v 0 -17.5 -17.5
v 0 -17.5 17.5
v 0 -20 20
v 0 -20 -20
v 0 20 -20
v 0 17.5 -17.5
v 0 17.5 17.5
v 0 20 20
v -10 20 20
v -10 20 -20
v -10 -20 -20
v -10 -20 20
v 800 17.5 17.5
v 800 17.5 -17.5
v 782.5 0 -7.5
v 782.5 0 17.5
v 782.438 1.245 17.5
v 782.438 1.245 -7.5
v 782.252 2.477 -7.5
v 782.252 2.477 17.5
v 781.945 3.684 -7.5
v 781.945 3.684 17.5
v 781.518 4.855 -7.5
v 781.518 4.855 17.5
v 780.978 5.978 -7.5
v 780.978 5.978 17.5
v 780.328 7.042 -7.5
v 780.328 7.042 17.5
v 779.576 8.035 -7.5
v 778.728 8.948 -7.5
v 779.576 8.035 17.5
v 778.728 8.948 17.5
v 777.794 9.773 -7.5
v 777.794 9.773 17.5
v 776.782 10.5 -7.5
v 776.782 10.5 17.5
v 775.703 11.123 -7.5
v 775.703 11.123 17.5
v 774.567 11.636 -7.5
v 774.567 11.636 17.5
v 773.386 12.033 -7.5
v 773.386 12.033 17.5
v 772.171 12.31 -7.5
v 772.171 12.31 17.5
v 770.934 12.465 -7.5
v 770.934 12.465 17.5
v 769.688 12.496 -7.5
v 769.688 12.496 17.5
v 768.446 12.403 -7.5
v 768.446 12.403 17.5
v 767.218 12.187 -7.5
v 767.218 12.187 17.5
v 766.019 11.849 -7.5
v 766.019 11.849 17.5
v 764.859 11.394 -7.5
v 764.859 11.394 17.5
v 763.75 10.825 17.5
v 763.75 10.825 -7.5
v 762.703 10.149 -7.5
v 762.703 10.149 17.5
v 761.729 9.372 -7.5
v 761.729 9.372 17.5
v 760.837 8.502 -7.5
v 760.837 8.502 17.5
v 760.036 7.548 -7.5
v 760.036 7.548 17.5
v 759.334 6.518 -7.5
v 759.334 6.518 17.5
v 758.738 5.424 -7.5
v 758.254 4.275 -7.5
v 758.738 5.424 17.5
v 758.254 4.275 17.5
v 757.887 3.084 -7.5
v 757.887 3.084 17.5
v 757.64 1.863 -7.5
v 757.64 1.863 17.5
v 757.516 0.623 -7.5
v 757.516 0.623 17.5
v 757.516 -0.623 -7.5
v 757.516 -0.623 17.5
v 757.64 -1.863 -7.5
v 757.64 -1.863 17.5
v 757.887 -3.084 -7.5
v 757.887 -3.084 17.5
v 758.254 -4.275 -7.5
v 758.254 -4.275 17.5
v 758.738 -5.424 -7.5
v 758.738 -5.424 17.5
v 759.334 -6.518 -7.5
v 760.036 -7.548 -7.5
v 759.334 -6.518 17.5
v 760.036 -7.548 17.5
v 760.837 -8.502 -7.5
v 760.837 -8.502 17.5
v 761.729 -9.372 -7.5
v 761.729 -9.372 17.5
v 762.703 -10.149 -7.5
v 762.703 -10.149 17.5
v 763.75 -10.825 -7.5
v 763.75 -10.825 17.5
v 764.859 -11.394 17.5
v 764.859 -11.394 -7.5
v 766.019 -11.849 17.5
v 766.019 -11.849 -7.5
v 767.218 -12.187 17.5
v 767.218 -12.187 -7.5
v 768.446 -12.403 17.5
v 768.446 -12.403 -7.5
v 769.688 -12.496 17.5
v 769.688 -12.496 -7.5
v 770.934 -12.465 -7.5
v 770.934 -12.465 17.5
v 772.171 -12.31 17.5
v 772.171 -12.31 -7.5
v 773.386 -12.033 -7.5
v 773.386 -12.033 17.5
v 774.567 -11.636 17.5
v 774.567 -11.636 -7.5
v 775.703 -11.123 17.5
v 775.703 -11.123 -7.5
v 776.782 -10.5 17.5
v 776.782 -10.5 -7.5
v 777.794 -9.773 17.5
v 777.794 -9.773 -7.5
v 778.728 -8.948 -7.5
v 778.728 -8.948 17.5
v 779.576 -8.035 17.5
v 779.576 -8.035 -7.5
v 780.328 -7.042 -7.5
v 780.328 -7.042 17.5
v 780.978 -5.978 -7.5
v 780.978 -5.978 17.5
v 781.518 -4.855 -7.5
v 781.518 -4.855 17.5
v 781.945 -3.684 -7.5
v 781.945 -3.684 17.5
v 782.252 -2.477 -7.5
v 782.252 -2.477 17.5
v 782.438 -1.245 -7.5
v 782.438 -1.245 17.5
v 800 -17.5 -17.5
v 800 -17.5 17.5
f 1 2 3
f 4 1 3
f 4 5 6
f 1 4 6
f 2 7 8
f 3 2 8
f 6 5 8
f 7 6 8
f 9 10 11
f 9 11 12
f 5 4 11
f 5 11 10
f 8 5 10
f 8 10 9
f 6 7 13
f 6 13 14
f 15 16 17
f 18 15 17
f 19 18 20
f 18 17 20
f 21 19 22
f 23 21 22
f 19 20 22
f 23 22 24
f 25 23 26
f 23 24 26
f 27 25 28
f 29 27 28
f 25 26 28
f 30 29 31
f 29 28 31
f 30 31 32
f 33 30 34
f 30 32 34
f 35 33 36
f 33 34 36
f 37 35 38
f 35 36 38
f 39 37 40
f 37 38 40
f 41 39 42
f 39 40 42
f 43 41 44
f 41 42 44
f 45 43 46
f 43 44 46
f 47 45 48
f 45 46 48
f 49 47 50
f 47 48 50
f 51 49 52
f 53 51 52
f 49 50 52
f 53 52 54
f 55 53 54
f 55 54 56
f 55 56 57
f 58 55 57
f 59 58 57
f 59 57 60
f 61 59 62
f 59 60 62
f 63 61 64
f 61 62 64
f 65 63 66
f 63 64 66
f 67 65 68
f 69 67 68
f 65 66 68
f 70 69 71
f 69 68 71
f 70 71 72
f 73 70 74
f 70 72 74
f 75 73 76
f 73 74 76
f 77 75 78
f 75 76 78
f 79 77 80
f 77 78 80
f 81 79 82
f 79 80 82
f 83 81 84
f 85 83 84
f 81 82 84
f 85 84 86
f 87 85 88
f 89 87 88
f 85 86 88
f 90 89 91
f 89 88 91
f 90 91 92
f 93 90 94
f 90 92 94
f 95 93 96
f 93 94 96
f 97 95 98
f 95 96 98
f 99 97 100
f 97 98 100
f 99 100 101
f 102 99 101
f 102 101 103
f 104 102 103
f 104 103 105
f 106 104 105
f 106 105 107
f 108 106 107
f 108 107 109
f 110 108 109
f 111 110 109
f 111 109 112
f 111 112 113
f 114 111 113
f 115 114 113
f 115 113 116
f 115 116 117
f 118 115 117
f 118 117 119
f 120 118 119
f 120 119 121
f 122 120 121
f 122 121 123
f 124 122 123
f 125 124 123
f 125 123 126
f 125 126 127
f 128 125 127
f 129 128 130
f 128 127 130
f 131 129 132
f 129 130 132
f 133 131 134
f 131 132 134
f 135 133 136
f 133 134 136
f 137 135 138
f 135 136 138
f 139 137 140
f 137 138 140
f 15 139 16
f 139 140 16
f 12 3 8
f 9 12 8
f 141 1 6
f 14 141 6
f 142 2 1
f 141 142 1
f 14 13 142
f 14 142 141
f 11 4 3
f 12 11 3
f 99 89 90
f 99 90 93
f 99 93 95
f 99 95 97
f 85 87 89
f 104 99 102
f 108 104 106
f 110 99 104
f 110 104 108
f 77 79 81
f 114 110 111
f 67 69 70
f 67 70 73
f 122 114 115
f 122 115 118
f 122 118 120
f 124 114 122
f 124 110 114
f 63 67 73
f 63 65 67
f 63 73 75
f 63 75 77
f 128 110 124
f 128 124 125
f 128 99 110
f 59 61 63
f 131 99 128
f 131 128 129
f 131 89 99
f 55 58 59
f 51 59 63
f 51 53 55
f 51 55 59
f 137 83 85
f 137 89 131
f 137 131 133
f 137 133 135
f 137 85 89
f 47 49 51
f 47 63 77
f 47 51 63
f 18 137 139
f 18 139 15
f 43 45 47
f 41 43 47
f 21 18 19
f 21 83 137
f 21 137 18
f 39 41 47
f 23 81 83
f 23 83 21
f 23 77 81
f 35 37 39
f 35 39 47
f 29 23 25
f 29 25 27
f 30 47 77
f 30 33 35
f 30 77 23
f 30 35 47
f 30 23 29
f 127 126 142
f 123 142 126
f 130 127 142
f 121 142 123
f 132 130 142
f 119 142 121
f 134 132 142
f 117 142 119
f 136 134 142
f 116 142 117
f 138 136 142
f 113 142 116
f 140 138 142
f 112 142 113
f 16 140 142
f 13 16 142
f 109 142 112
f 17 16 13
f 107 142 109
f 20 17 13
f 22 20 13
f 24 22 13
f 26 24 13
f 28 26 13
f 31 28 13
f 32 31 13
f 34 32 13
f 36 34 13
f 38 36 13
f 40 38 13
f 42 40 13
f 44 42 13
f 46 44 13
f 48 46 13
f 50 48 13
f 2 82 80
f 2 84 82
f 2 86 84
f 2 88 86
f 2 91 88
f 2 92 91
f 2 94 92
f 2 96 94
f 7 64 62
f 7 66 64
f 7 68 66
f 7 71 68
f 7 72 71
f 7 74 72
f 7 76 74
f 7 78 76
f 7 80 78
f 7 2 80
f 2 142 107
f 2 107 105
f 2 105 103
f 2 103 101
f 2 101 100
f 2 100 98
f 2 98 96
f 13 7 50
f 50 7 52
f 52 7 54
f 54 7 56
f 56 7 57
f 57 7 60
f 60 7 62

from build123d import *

# Parameters (mm, degrees)
ESQUISSE1_W             = 35
ESQUISSE1_H             = 35
BOSS_EXTRU_1_DEPTH      = 800
ESQUISSE2_W             = 40
ESQUISSE2_H             = 40
ESQUISSE2_W_2           = 35
ESQUISSE2_H_2           = 35
BOSS_EXTRU_2_DEPTH      = 10
ESQUISSE7_R             = 12.5
ENL_V_MAT_EXTRU_1_DEPTH = 25


with BuildPart() as part:
    # Esquisse1 → Boss.-Extru.1 (new body)
    with BuildSketch(Plane(origin=(0, 0, 0), x_dir=(0, 0, -1), z_dir=(1, 0, 0))):
        Rectangle(ESQUISSE1_W, ESQUISSE1_H)
    extrude(amount=BOSS_EXTRU_1_DEPTH)

    # Esquisse2 → Boss.-Extru.2 (add)
    # profile 1 of 2: a face of its own
    with BuildSketch(Plane.ZY):
        Rectangle(ESQUISSE2_W, ESQUISSE2_H)
        Rectangle(ESQUISSE2_W_2, ESQUISSE2_H_2, mode=Mode.SUBTRACT)
    # profile 2 of 2: a face of its own
    with BuildSketch(Plane.ZY):
        Rectangle(ESQUISSE2_W_2, ESQUISSE2_H_2)
    extrude(amount=BOSS_EXTRU_2_DEPTH)

    # Esquisse7 → Enlèv. mat.-Extru.1 (cut)
    with BuildSketch(Plane.XY.offset(17.5)):
        with Locations((770, 0)):
            Circle(ESQUISSE7_R)
    extrude(amount=-ENL_V_MAT_EXTRU_1_DEPTH, mode=Mode.SUBTRACT)


solid = part.part
